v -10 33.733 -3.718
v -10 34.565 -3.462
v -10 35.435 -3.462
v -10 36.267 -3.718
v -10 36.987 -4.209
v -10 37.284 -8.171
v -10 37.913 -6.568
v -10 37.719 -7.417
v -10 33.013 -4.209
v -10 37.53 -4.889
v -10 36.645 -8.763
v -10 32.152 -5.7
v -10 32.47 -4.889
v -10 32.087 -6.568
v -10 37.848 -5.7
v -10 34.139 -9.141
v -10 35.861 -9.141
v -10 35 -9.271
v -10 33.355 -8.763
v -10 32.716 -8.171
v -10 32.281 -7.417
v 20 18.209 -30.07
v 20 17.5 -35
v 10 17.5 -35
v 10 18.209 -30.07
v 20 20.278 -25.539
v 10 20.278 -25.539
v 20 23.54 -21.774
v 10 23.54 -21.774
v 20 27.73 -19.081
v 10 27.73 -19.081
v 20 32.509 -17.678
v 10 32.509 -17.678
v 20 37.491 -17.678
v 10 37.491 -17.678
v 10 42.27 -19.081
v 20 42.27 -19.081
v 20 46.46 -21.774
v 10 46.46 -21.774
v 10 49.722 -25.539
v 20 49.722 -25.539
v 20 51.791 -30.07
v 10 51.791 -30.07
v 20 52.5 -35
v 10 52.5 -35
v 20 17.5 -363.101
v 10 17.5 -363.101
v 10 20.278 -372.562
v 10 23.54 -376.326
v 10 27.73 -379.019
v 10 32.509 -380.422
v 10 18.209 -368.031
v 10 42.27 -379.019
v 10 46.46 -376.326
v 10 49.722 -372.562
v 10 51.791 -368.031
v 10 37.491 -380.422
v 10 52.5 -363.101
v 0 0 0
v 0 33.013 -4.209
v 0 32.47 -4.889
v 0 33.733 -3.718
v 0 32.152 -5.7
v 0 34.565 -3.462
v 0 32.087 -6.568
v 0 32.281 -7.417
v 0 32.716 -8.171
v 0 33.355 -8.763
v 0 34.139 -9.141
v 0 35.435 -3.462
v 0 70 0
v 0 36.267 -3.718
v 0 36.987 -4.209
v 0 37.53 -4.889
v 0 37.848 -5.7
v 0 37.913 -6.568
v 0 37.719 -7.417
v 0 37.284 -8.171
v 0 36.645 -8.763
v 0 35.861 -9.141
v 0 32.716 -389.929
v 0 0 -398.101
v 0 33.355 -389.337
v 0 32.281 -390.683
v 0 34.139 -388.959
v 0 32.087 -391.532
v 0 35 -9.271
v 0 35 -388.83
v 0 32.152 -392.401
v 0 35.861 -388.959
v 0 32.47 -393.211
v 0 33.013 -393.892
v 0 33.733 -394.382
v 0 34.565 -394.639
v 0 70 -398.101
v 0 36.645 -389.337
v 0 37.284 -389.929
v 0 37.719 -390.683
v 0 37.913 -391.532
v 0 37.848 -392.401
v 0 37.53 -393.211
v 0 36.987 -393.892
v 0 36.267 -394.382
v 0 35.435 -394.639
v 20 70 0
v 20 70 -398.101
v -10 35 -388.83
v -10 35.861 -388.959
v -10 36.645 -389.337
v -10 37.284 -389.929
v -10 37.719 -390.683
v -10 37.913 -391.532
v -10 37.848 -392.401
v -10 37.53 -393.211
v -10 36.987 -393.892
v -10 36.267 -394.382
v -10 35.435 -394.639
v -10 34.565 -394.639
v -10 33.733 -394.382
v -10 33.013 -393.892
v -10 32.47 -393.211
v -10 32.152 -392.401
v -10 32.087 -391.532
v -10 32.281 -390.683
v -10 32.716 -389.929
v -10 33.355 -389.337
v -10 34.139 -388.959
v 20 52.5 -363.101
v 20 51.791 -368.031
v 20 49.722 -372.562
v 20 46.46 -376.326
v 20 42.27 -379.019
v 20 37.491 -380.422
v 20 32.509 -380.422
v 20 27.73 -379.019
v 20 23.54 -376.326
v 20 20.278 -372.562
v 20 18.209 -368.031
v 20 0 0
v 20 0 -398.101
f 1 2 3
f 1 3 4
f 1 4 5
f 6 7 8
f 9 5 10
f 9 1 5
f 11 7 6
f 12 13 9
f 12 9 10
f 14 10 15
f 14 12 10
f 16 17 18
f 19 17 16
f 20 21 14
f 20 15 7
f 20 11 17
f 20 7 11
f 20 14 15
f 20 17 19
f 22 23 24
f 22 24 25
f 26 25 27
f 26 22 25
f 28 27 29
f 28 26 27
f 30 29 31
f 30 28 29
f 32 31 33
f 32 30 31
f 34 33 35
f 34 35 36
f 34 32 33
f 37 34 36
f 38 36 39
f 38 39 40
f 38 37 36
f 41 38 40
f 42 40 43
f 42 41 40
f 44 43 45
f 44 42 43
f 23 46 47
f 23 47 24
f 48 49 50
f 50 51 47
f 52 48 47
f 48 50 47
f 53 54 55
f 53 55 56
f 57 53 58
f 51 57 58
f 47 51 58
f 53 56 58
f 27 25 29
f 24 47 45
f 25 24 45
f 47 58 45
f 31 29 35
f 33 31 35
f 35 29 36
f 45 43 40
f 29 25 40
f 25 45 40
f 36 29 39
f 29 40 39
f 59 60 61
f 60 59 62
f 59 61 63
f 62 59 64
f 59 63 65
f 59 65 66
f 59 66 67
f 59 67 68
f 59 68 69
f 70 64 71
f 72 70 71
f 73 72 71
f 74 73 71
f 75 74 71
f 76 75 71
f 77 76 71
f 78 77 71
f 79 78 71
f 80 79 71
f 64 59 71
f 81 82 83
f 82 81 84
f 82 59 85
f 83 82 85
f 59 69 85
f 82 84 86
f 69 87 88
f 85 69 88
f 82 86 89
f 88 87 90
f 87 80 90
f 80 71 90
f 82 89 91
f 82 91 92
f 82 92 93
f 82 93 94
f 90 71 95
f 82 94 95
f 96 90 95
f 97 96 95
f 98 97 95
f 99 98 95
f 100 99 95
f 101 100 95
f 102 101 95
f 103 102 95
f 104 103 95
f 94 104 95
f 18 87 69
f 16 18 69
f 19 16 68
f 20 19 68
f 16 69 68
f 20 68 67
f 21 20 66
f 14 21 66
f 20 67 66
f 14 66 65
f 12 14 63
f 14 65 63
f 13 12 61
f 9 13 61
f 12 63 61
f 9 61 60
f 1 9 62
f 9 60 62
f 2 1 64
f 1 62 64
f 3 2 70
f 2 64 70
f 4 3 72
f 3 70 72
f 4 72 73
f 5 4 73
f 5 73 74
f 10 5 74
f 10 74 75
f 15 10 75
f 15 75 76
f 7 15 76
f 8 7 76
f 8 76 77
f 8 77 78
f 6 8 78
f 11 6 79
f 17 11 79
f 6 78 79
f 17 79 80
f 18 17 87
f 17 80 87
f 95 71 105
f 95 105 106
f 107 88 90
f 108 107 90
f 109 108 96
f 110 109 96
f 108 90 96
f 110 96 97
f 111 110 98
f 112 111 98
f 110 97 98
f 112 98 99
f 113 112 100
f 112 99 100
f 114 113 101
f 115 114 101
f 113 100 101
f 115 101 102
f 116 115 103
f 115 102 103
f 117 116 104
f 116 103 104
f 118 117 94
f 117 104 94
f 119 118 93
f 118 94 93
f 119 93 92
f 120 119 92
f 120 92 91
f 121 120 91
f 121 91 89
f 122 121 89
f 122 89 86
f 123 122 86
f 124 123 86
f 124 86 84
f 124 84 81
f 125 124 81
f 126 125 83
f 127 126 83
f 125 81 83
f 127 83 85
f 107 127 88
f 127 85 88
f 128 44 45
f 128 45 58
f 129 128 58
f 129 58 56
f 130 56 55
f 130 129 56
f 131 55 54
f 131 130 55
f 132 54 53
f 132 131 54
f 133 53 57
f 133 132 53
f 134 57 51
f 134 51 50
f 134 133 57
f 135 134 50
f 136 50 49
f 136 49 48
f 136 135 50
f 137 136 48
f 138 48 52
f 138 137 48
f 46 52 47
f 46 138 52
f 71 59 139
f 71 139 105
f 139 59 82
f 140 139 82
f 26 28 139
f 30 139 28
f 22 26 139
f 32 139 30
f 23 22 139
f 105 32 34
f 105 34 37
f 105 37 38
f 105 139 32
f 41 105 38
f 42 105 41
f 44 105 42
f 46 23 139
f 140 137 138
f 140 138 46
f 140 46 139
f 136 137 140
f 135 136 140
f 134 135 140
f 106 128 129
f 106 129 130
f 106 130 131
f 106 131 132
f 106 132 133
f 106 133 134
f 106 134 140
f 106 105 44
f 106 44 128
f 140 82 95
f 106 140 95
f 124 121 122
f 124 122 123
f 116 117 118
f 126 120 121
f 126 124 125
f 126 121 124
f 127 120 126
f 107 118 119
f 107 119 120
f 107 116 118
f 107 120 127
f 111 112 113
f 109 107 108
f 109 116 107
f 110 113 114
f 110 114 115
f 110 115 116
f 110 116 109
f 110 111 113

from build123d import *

# Parameters (mm, degrees)
SKETCH2_W           = 398.100558659
SKETCH2_H           = 70
BOSS_EXTRUDE1_DEPTH = 20
CUT_EXTRUDE1_DEPTH  = 10
SKETCH4_R           = 2.921
BOSS_EXTRUDE2_DEPTH = 10


with BuildPart() as part:
    # Sketch2 → Boss-Extrude1 (new body)
    with BuildSketch(Plane(origin=(0, 0, 0), x_dir=(0, 0, -1), z_dir=(1, 0, 0))):
        with Locations((199.05027933, 35)):
            Rectangle(SKETCH2_W, SKETCH2_H)
    extrude(amount=BOSS_EXTRUDE1_DEPTH)

    # Sketch3 → Cut-Extrude1 (cut)
    with BuildSketch(Plane(origin=(20, 0, 0), x_dir=(0, 0, -1), z_dir=(1, 0, 0))):
        with BuildLine():
            Line((35, 52.5), (363.100558659, 52.5))
            ThreePointArc((363.100558659, 52.5), (380.600558659, 35), (363.100558659, 17.5))
            Line((363.100558659, 17.5), (35, 17.5))
            ThreePointArc((35, 17.5), (17.5, 35), (35, 52.5))
        make_face()
    extrude(amount=-CUT_EXTRUDE1_DEPTH, mode=Mode.SUBTRACT)

    # Sketch4 → Boss-Extrude2 (add)
    with BuildSketch(Plane.ZY):
        with Locations((-391.750558659, 35)):
            Circle(SKETCH4_R)
        with Locations(Location((-6.35, 35, 0), (0, 0, 180))):
            Circle(SKETCH4_R)
    extrude(amount=BOSS_EXTRUDE2_DEPTH)


solid = part.part
